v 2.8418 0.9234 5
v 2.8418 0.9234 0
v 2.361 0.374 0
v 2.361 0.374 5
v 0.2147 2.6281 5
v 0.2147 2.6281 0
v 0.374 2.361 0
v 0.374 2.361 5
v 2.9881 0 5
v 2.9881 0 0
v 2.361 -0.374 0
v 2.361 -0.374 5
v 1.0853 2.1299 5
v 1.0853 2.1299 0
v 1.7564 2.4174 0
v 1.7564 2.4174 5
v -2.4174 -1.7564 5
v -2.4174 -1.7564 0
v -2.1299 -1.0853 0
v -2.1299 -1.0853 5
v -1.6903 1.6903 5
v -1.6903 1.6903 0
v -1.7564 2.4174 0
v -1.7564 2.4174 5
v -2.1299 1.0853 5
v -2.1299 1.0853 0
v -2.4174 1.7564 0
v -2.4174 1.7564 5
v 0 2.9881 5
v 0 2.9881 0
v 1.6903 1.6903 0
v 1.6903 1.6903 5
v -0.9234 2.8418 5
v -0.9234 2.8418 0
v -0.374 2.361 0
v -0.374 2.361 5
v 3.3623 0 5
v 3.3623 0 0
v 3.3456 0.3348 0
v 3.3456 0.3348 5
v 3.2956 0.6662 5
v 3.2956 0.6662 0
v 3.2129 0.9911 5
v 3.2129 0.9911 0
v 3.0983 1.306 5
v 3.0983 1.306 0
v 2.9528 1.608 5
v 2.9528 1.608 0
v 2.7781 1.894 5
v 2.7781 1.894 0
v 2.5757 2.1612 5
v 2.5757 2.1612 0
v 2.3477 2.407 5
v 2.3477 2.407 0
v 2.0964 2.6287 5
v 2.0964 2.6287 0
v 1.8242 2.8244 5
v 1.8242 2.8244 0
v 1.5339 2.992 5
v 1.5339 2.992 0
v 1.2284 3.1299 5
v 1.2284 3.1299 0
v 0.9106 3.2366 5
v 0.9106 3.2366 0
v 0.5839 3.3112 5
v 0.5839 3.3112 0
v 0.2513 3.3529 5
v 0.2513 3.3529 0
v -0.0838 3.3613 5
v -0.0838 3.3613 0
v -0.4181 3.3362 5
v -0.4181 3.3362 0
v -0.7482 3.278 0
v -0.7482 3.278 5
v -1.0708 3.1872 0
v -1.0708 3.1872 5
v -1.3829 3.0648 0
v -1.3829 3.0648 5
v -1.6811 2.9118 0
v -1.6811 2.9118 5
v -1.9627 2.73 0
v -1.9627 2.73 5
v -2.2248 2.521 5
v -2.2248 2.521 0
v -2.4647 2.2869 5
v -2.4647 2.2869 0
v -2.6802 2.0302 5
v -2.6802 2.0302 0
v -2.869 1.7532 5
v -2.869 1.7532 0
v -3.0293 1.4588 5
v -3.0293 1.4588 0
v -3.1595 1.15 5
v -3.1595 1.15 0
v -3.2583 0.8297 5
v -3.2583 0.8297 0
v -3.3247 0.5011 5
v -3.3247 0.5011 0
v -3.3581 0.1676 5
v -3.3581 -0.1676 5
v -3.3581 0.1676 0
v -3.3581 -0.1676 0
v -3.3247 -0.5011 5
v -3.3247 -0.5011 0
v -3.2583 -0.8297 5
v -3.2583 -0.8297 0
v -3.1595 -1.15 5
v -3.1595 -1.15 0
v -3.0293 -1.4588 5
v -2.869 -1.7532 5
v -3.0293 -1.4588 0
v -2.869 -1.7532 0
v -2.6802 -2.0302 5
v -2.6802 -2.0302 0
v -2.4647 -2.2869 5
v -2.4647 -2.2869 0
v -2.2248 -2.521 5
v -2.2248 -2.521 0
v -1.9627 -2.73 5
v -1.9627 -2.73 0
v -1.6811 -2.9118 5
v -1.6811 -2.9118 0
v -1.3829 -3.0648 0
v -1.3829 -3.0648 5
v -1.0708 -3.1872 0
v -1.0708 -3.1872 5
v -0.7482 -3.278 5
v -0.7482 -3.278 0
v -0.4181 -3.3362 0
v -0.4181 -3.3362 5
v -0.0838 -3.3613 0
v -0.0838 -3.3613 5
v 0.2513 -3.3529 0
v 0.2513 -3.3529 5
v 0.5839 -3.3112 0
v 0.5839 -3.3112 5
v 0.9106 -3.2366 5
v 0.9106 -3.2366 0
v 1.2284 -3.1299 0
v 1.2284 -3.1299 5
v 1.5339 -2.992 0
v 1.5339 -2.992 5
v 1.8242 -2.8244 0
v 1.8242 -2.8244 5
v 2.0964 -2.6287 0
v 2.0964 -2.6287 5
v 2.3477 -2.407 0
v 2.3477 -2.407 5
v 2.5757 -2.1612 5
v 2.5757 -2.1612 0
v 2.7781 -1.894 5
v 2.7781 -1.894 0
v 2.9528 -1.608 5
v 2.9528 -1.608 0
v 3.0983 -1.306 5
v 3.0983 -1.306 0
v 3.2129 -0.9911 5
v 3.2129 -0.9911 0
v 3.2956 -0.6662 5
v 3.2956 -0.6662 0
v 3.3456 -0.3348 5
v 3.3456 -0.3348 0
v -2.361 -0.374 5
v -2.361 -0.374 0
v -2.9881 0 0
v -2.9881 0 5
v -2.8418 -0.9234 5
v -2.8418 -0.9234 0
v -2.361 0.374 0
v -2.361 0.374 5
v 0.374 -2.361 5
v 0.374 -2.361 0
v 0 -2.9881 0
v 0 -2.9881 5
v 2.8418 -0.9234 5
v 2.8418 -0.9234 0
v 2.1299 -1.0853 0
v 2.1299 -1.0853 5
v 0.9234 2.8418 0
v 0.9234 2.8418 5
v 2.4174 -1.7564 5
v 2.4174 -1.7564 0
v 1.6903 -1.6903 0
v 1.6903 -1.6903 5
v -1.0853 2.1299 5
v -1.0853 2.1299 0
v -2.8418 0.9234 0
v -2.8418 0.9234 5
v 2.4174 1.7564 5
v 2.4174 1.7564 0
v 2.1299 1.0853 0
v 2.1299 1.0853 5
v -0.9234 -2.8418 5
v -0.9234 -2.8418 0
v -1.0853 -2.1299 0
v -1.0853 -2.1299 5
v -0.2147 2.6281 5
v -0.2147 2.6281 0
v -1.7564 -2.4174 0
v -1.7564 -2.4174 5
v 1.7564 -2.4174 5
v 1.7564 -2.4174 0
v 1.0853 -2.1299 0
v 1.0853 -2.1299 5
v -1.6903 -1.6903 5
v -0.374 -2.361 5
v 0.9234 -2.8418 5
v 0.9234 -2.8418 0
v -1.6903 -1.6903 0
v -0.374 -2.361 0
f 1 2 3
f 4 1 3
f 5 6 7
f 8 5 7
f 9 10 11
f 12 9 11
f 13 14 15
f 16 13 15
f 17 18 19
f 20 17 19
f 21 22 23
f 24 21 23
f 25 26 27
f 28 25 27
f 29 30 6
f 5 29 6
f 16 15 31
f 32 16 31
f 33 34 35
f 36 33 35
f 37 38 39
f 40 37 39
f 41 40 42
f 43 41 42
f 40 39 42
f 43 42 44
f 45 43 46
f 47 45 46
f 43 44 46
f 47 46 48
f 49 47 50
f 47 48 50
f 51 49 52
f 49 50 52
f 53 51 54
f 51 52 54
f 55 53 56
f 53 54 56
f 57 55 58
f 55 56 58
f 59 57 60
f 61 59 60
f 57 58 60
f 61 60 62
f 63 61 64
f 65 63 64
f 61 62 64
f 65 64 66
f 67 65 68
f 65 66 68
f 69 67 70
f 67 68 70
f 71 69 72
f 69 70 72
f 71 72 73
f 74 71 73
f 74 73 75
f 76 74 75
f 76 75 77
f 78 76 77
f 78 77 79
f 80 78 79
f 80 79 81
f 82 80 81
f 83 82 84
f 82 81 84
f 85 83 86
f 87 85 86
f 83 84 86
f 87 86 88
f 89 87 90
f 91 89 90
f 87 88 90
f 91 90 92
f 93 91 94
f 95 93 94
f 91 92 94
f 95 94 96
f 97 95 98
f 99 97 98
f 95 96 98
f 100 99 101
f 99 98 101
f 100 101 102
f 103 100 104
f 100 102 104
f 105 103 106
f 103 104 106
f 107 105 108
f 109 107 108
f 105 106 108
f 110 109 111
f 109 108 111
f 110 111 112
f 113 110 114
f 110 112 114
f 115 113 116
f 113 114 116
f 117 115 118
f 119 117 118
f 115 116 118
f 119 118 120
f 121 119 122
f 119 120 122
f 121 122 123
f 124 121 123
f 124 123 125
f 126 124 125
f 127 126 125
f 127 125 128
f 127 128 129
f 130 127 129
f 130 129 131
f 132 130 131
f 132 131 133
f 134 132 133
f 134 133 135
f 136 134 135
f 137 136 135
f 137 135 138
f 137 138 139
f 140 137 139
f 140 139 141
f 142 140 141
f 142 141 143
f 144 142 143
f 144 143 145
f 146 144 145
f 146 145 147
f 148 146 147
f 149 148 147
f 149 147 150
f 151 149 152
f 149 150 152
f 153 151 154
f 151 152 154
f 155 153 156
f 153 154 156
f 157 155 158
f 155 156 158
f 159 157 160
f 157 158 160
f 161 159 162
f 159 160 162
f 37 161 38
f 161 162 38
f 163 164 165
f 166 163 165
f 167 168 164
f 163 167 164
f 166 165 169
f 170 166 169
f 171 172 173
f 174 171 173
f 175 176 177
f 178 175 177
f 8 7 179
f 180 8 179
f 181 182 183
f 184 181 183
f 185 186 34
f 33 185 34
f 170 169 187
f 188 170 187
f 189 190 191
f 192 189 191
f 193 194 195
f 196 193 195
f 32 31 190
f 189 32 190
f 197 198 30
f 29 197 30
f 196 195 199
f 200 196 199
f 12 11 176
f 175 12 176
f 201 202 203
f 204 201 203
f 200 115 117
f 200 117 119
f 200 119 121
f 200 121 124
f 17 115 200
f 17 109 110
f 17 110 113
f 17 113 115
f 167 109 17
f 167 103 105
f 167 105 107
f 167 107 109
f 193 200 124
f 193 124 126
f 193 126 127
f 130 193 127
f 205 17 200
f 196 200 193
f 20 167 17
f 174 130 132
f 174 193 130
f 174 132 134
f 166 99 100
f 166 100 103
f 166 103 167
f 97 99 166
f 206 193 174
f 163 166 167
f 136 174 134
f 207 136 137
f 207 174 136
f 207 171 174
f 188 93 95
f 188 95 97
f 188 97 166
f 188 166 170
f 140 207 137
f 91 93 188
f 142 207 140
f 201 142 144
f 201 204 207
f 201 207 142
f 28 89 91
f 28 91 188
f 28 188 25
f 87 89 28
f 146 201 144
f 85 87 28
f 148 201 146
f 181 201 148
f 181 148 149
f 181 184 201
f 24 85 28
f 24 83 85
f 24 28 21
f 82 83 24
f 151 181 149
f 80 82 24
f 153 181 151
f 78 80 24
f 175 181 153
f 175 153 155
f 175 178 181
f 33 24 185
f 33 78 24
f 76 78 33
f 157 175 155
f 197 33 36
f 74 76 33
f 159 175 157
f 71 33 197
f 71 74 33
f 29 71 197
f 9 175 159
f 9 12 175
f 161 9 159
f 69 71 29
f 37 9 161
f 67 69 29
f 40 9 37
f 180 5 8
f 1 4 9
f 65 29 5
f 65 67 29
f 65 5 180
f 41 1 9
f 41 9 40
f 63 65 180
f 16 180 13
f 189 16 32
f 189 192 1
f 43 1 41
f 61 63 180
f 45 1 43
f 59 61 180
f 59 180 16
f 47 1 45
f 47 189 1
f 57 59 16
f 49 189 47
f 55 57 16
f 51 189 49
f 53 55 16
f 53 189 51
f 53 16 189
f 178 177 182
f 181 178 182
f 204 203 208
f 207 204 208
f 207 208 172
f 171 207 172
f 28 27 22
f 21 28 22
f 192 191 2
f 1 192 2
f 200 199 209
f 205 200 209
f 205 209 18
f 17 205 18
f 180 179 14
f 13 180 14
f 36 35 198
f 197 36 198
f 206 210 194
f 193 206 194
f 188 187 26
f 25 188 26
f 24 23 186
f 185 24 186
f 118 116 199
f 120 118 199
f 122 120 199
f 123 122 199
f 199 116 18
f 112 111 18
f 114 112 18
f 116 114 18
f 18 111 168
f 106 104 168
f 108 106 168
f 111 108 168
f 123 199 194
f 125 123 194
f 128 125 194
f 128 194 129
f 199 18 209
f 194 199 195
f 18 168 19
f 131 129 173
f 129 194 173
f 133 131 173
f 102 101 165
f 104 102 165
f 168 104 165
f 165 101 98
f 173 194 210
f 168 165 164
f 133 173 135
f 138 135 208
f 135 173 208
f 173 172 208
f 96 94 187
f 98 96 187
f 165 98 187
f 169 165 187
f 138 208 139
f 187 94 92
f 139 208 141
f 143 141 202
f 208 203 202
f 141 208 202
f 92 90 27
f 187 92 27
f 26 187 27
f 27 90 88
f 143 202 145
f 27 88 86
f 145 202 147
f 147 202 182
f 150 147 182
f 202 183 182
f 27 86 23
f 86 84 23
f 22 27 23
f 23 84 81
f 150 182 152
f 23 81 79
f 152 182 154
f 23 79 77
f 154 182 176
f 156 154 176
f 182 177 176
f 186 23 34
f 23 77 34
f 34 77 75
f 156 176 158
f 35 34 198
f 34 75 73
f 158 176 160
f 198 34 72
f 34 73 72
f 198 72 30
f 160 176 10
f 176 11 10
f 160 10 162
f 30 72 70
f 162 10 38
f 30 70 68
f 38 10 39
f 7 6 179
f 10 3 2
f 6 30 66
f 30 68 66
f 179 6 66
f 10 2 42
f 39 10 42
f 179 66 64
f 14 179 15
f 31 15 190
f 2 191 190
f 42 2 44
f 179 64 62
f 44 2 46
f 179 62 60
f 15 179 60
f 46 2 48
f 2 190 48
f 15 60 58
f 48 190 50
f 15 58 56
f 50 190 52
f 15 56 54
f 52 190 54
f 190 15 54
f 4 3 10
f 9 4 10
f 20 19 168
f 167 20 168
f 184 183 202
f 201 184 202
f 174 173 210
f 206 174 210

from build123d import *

# Parameters (mm, degrees)
SERVOSPLINEPROFILE_R = 3.362297175
SERVOKEY_DEPTH       = 5


with BuildPart() as part:
    # ServoSplineProfile → ServoKey (new body)
    with BuildSketch(Plane.XY):
        Circle(SERVOSPLINEPROFILE_R)
        Polygon((0.214716449, 2.628050171), (0.373952201, 2.361041273), (0.923370571, 2.841842406), (1.085251555, 2.129926103), (1.756355197, 2.41741554), (1.690318926, 1.690318926), (2.41741554, 1.756355197), (2.129926103, 1.085251555), (2.841842406, 0.923370571), (2.361041273, 0.373952201), (2.988089937, 0), (2.361041273, -0.373952201), (2.841842406, -0.923370571), (2.129926103, -1.085251555), (2.41741554, -1.756355197), (1.690318926, -1.690318926), (1.756355197, -2.41741554), (1.085251555, -2.129926103), (0.923370571, -2.841842406), (0.373952201, -2.361041273), (0, -2.988089937), (-0.373952201, -2.361041273), (-0.923370571, -2.841842406), (-1.085251555, -2.129926103), (-1.756355197, -2.41741554), (-1.690318926, -1.690318926), (-2.41741554, -1.756355197), (-2.129926103, -1.085251555), (-2.841842406, -0.923370571), (-2.361041273, -0.373952201), (-2.988089937, 0), (-2.361041273, 0.373952201), (-2.841842406, 0.923370571), (-2.129926103, 1.085251555), (-2.41741554, 1.756355197), (-1.690318926, 1.690318926), (-1.756355197, 2.41741554), (-1.085251555, 2.129926103), (-0.923370571, 2.841842406), (-0.373952201, 2.361041273), (-0.214716449, 2.628050171), (0, 2.988089937), align=None, mode=Mode.SUBTRACT)
    extrude(amount=SERVOKEY_DEPTH)


solid = part.part
